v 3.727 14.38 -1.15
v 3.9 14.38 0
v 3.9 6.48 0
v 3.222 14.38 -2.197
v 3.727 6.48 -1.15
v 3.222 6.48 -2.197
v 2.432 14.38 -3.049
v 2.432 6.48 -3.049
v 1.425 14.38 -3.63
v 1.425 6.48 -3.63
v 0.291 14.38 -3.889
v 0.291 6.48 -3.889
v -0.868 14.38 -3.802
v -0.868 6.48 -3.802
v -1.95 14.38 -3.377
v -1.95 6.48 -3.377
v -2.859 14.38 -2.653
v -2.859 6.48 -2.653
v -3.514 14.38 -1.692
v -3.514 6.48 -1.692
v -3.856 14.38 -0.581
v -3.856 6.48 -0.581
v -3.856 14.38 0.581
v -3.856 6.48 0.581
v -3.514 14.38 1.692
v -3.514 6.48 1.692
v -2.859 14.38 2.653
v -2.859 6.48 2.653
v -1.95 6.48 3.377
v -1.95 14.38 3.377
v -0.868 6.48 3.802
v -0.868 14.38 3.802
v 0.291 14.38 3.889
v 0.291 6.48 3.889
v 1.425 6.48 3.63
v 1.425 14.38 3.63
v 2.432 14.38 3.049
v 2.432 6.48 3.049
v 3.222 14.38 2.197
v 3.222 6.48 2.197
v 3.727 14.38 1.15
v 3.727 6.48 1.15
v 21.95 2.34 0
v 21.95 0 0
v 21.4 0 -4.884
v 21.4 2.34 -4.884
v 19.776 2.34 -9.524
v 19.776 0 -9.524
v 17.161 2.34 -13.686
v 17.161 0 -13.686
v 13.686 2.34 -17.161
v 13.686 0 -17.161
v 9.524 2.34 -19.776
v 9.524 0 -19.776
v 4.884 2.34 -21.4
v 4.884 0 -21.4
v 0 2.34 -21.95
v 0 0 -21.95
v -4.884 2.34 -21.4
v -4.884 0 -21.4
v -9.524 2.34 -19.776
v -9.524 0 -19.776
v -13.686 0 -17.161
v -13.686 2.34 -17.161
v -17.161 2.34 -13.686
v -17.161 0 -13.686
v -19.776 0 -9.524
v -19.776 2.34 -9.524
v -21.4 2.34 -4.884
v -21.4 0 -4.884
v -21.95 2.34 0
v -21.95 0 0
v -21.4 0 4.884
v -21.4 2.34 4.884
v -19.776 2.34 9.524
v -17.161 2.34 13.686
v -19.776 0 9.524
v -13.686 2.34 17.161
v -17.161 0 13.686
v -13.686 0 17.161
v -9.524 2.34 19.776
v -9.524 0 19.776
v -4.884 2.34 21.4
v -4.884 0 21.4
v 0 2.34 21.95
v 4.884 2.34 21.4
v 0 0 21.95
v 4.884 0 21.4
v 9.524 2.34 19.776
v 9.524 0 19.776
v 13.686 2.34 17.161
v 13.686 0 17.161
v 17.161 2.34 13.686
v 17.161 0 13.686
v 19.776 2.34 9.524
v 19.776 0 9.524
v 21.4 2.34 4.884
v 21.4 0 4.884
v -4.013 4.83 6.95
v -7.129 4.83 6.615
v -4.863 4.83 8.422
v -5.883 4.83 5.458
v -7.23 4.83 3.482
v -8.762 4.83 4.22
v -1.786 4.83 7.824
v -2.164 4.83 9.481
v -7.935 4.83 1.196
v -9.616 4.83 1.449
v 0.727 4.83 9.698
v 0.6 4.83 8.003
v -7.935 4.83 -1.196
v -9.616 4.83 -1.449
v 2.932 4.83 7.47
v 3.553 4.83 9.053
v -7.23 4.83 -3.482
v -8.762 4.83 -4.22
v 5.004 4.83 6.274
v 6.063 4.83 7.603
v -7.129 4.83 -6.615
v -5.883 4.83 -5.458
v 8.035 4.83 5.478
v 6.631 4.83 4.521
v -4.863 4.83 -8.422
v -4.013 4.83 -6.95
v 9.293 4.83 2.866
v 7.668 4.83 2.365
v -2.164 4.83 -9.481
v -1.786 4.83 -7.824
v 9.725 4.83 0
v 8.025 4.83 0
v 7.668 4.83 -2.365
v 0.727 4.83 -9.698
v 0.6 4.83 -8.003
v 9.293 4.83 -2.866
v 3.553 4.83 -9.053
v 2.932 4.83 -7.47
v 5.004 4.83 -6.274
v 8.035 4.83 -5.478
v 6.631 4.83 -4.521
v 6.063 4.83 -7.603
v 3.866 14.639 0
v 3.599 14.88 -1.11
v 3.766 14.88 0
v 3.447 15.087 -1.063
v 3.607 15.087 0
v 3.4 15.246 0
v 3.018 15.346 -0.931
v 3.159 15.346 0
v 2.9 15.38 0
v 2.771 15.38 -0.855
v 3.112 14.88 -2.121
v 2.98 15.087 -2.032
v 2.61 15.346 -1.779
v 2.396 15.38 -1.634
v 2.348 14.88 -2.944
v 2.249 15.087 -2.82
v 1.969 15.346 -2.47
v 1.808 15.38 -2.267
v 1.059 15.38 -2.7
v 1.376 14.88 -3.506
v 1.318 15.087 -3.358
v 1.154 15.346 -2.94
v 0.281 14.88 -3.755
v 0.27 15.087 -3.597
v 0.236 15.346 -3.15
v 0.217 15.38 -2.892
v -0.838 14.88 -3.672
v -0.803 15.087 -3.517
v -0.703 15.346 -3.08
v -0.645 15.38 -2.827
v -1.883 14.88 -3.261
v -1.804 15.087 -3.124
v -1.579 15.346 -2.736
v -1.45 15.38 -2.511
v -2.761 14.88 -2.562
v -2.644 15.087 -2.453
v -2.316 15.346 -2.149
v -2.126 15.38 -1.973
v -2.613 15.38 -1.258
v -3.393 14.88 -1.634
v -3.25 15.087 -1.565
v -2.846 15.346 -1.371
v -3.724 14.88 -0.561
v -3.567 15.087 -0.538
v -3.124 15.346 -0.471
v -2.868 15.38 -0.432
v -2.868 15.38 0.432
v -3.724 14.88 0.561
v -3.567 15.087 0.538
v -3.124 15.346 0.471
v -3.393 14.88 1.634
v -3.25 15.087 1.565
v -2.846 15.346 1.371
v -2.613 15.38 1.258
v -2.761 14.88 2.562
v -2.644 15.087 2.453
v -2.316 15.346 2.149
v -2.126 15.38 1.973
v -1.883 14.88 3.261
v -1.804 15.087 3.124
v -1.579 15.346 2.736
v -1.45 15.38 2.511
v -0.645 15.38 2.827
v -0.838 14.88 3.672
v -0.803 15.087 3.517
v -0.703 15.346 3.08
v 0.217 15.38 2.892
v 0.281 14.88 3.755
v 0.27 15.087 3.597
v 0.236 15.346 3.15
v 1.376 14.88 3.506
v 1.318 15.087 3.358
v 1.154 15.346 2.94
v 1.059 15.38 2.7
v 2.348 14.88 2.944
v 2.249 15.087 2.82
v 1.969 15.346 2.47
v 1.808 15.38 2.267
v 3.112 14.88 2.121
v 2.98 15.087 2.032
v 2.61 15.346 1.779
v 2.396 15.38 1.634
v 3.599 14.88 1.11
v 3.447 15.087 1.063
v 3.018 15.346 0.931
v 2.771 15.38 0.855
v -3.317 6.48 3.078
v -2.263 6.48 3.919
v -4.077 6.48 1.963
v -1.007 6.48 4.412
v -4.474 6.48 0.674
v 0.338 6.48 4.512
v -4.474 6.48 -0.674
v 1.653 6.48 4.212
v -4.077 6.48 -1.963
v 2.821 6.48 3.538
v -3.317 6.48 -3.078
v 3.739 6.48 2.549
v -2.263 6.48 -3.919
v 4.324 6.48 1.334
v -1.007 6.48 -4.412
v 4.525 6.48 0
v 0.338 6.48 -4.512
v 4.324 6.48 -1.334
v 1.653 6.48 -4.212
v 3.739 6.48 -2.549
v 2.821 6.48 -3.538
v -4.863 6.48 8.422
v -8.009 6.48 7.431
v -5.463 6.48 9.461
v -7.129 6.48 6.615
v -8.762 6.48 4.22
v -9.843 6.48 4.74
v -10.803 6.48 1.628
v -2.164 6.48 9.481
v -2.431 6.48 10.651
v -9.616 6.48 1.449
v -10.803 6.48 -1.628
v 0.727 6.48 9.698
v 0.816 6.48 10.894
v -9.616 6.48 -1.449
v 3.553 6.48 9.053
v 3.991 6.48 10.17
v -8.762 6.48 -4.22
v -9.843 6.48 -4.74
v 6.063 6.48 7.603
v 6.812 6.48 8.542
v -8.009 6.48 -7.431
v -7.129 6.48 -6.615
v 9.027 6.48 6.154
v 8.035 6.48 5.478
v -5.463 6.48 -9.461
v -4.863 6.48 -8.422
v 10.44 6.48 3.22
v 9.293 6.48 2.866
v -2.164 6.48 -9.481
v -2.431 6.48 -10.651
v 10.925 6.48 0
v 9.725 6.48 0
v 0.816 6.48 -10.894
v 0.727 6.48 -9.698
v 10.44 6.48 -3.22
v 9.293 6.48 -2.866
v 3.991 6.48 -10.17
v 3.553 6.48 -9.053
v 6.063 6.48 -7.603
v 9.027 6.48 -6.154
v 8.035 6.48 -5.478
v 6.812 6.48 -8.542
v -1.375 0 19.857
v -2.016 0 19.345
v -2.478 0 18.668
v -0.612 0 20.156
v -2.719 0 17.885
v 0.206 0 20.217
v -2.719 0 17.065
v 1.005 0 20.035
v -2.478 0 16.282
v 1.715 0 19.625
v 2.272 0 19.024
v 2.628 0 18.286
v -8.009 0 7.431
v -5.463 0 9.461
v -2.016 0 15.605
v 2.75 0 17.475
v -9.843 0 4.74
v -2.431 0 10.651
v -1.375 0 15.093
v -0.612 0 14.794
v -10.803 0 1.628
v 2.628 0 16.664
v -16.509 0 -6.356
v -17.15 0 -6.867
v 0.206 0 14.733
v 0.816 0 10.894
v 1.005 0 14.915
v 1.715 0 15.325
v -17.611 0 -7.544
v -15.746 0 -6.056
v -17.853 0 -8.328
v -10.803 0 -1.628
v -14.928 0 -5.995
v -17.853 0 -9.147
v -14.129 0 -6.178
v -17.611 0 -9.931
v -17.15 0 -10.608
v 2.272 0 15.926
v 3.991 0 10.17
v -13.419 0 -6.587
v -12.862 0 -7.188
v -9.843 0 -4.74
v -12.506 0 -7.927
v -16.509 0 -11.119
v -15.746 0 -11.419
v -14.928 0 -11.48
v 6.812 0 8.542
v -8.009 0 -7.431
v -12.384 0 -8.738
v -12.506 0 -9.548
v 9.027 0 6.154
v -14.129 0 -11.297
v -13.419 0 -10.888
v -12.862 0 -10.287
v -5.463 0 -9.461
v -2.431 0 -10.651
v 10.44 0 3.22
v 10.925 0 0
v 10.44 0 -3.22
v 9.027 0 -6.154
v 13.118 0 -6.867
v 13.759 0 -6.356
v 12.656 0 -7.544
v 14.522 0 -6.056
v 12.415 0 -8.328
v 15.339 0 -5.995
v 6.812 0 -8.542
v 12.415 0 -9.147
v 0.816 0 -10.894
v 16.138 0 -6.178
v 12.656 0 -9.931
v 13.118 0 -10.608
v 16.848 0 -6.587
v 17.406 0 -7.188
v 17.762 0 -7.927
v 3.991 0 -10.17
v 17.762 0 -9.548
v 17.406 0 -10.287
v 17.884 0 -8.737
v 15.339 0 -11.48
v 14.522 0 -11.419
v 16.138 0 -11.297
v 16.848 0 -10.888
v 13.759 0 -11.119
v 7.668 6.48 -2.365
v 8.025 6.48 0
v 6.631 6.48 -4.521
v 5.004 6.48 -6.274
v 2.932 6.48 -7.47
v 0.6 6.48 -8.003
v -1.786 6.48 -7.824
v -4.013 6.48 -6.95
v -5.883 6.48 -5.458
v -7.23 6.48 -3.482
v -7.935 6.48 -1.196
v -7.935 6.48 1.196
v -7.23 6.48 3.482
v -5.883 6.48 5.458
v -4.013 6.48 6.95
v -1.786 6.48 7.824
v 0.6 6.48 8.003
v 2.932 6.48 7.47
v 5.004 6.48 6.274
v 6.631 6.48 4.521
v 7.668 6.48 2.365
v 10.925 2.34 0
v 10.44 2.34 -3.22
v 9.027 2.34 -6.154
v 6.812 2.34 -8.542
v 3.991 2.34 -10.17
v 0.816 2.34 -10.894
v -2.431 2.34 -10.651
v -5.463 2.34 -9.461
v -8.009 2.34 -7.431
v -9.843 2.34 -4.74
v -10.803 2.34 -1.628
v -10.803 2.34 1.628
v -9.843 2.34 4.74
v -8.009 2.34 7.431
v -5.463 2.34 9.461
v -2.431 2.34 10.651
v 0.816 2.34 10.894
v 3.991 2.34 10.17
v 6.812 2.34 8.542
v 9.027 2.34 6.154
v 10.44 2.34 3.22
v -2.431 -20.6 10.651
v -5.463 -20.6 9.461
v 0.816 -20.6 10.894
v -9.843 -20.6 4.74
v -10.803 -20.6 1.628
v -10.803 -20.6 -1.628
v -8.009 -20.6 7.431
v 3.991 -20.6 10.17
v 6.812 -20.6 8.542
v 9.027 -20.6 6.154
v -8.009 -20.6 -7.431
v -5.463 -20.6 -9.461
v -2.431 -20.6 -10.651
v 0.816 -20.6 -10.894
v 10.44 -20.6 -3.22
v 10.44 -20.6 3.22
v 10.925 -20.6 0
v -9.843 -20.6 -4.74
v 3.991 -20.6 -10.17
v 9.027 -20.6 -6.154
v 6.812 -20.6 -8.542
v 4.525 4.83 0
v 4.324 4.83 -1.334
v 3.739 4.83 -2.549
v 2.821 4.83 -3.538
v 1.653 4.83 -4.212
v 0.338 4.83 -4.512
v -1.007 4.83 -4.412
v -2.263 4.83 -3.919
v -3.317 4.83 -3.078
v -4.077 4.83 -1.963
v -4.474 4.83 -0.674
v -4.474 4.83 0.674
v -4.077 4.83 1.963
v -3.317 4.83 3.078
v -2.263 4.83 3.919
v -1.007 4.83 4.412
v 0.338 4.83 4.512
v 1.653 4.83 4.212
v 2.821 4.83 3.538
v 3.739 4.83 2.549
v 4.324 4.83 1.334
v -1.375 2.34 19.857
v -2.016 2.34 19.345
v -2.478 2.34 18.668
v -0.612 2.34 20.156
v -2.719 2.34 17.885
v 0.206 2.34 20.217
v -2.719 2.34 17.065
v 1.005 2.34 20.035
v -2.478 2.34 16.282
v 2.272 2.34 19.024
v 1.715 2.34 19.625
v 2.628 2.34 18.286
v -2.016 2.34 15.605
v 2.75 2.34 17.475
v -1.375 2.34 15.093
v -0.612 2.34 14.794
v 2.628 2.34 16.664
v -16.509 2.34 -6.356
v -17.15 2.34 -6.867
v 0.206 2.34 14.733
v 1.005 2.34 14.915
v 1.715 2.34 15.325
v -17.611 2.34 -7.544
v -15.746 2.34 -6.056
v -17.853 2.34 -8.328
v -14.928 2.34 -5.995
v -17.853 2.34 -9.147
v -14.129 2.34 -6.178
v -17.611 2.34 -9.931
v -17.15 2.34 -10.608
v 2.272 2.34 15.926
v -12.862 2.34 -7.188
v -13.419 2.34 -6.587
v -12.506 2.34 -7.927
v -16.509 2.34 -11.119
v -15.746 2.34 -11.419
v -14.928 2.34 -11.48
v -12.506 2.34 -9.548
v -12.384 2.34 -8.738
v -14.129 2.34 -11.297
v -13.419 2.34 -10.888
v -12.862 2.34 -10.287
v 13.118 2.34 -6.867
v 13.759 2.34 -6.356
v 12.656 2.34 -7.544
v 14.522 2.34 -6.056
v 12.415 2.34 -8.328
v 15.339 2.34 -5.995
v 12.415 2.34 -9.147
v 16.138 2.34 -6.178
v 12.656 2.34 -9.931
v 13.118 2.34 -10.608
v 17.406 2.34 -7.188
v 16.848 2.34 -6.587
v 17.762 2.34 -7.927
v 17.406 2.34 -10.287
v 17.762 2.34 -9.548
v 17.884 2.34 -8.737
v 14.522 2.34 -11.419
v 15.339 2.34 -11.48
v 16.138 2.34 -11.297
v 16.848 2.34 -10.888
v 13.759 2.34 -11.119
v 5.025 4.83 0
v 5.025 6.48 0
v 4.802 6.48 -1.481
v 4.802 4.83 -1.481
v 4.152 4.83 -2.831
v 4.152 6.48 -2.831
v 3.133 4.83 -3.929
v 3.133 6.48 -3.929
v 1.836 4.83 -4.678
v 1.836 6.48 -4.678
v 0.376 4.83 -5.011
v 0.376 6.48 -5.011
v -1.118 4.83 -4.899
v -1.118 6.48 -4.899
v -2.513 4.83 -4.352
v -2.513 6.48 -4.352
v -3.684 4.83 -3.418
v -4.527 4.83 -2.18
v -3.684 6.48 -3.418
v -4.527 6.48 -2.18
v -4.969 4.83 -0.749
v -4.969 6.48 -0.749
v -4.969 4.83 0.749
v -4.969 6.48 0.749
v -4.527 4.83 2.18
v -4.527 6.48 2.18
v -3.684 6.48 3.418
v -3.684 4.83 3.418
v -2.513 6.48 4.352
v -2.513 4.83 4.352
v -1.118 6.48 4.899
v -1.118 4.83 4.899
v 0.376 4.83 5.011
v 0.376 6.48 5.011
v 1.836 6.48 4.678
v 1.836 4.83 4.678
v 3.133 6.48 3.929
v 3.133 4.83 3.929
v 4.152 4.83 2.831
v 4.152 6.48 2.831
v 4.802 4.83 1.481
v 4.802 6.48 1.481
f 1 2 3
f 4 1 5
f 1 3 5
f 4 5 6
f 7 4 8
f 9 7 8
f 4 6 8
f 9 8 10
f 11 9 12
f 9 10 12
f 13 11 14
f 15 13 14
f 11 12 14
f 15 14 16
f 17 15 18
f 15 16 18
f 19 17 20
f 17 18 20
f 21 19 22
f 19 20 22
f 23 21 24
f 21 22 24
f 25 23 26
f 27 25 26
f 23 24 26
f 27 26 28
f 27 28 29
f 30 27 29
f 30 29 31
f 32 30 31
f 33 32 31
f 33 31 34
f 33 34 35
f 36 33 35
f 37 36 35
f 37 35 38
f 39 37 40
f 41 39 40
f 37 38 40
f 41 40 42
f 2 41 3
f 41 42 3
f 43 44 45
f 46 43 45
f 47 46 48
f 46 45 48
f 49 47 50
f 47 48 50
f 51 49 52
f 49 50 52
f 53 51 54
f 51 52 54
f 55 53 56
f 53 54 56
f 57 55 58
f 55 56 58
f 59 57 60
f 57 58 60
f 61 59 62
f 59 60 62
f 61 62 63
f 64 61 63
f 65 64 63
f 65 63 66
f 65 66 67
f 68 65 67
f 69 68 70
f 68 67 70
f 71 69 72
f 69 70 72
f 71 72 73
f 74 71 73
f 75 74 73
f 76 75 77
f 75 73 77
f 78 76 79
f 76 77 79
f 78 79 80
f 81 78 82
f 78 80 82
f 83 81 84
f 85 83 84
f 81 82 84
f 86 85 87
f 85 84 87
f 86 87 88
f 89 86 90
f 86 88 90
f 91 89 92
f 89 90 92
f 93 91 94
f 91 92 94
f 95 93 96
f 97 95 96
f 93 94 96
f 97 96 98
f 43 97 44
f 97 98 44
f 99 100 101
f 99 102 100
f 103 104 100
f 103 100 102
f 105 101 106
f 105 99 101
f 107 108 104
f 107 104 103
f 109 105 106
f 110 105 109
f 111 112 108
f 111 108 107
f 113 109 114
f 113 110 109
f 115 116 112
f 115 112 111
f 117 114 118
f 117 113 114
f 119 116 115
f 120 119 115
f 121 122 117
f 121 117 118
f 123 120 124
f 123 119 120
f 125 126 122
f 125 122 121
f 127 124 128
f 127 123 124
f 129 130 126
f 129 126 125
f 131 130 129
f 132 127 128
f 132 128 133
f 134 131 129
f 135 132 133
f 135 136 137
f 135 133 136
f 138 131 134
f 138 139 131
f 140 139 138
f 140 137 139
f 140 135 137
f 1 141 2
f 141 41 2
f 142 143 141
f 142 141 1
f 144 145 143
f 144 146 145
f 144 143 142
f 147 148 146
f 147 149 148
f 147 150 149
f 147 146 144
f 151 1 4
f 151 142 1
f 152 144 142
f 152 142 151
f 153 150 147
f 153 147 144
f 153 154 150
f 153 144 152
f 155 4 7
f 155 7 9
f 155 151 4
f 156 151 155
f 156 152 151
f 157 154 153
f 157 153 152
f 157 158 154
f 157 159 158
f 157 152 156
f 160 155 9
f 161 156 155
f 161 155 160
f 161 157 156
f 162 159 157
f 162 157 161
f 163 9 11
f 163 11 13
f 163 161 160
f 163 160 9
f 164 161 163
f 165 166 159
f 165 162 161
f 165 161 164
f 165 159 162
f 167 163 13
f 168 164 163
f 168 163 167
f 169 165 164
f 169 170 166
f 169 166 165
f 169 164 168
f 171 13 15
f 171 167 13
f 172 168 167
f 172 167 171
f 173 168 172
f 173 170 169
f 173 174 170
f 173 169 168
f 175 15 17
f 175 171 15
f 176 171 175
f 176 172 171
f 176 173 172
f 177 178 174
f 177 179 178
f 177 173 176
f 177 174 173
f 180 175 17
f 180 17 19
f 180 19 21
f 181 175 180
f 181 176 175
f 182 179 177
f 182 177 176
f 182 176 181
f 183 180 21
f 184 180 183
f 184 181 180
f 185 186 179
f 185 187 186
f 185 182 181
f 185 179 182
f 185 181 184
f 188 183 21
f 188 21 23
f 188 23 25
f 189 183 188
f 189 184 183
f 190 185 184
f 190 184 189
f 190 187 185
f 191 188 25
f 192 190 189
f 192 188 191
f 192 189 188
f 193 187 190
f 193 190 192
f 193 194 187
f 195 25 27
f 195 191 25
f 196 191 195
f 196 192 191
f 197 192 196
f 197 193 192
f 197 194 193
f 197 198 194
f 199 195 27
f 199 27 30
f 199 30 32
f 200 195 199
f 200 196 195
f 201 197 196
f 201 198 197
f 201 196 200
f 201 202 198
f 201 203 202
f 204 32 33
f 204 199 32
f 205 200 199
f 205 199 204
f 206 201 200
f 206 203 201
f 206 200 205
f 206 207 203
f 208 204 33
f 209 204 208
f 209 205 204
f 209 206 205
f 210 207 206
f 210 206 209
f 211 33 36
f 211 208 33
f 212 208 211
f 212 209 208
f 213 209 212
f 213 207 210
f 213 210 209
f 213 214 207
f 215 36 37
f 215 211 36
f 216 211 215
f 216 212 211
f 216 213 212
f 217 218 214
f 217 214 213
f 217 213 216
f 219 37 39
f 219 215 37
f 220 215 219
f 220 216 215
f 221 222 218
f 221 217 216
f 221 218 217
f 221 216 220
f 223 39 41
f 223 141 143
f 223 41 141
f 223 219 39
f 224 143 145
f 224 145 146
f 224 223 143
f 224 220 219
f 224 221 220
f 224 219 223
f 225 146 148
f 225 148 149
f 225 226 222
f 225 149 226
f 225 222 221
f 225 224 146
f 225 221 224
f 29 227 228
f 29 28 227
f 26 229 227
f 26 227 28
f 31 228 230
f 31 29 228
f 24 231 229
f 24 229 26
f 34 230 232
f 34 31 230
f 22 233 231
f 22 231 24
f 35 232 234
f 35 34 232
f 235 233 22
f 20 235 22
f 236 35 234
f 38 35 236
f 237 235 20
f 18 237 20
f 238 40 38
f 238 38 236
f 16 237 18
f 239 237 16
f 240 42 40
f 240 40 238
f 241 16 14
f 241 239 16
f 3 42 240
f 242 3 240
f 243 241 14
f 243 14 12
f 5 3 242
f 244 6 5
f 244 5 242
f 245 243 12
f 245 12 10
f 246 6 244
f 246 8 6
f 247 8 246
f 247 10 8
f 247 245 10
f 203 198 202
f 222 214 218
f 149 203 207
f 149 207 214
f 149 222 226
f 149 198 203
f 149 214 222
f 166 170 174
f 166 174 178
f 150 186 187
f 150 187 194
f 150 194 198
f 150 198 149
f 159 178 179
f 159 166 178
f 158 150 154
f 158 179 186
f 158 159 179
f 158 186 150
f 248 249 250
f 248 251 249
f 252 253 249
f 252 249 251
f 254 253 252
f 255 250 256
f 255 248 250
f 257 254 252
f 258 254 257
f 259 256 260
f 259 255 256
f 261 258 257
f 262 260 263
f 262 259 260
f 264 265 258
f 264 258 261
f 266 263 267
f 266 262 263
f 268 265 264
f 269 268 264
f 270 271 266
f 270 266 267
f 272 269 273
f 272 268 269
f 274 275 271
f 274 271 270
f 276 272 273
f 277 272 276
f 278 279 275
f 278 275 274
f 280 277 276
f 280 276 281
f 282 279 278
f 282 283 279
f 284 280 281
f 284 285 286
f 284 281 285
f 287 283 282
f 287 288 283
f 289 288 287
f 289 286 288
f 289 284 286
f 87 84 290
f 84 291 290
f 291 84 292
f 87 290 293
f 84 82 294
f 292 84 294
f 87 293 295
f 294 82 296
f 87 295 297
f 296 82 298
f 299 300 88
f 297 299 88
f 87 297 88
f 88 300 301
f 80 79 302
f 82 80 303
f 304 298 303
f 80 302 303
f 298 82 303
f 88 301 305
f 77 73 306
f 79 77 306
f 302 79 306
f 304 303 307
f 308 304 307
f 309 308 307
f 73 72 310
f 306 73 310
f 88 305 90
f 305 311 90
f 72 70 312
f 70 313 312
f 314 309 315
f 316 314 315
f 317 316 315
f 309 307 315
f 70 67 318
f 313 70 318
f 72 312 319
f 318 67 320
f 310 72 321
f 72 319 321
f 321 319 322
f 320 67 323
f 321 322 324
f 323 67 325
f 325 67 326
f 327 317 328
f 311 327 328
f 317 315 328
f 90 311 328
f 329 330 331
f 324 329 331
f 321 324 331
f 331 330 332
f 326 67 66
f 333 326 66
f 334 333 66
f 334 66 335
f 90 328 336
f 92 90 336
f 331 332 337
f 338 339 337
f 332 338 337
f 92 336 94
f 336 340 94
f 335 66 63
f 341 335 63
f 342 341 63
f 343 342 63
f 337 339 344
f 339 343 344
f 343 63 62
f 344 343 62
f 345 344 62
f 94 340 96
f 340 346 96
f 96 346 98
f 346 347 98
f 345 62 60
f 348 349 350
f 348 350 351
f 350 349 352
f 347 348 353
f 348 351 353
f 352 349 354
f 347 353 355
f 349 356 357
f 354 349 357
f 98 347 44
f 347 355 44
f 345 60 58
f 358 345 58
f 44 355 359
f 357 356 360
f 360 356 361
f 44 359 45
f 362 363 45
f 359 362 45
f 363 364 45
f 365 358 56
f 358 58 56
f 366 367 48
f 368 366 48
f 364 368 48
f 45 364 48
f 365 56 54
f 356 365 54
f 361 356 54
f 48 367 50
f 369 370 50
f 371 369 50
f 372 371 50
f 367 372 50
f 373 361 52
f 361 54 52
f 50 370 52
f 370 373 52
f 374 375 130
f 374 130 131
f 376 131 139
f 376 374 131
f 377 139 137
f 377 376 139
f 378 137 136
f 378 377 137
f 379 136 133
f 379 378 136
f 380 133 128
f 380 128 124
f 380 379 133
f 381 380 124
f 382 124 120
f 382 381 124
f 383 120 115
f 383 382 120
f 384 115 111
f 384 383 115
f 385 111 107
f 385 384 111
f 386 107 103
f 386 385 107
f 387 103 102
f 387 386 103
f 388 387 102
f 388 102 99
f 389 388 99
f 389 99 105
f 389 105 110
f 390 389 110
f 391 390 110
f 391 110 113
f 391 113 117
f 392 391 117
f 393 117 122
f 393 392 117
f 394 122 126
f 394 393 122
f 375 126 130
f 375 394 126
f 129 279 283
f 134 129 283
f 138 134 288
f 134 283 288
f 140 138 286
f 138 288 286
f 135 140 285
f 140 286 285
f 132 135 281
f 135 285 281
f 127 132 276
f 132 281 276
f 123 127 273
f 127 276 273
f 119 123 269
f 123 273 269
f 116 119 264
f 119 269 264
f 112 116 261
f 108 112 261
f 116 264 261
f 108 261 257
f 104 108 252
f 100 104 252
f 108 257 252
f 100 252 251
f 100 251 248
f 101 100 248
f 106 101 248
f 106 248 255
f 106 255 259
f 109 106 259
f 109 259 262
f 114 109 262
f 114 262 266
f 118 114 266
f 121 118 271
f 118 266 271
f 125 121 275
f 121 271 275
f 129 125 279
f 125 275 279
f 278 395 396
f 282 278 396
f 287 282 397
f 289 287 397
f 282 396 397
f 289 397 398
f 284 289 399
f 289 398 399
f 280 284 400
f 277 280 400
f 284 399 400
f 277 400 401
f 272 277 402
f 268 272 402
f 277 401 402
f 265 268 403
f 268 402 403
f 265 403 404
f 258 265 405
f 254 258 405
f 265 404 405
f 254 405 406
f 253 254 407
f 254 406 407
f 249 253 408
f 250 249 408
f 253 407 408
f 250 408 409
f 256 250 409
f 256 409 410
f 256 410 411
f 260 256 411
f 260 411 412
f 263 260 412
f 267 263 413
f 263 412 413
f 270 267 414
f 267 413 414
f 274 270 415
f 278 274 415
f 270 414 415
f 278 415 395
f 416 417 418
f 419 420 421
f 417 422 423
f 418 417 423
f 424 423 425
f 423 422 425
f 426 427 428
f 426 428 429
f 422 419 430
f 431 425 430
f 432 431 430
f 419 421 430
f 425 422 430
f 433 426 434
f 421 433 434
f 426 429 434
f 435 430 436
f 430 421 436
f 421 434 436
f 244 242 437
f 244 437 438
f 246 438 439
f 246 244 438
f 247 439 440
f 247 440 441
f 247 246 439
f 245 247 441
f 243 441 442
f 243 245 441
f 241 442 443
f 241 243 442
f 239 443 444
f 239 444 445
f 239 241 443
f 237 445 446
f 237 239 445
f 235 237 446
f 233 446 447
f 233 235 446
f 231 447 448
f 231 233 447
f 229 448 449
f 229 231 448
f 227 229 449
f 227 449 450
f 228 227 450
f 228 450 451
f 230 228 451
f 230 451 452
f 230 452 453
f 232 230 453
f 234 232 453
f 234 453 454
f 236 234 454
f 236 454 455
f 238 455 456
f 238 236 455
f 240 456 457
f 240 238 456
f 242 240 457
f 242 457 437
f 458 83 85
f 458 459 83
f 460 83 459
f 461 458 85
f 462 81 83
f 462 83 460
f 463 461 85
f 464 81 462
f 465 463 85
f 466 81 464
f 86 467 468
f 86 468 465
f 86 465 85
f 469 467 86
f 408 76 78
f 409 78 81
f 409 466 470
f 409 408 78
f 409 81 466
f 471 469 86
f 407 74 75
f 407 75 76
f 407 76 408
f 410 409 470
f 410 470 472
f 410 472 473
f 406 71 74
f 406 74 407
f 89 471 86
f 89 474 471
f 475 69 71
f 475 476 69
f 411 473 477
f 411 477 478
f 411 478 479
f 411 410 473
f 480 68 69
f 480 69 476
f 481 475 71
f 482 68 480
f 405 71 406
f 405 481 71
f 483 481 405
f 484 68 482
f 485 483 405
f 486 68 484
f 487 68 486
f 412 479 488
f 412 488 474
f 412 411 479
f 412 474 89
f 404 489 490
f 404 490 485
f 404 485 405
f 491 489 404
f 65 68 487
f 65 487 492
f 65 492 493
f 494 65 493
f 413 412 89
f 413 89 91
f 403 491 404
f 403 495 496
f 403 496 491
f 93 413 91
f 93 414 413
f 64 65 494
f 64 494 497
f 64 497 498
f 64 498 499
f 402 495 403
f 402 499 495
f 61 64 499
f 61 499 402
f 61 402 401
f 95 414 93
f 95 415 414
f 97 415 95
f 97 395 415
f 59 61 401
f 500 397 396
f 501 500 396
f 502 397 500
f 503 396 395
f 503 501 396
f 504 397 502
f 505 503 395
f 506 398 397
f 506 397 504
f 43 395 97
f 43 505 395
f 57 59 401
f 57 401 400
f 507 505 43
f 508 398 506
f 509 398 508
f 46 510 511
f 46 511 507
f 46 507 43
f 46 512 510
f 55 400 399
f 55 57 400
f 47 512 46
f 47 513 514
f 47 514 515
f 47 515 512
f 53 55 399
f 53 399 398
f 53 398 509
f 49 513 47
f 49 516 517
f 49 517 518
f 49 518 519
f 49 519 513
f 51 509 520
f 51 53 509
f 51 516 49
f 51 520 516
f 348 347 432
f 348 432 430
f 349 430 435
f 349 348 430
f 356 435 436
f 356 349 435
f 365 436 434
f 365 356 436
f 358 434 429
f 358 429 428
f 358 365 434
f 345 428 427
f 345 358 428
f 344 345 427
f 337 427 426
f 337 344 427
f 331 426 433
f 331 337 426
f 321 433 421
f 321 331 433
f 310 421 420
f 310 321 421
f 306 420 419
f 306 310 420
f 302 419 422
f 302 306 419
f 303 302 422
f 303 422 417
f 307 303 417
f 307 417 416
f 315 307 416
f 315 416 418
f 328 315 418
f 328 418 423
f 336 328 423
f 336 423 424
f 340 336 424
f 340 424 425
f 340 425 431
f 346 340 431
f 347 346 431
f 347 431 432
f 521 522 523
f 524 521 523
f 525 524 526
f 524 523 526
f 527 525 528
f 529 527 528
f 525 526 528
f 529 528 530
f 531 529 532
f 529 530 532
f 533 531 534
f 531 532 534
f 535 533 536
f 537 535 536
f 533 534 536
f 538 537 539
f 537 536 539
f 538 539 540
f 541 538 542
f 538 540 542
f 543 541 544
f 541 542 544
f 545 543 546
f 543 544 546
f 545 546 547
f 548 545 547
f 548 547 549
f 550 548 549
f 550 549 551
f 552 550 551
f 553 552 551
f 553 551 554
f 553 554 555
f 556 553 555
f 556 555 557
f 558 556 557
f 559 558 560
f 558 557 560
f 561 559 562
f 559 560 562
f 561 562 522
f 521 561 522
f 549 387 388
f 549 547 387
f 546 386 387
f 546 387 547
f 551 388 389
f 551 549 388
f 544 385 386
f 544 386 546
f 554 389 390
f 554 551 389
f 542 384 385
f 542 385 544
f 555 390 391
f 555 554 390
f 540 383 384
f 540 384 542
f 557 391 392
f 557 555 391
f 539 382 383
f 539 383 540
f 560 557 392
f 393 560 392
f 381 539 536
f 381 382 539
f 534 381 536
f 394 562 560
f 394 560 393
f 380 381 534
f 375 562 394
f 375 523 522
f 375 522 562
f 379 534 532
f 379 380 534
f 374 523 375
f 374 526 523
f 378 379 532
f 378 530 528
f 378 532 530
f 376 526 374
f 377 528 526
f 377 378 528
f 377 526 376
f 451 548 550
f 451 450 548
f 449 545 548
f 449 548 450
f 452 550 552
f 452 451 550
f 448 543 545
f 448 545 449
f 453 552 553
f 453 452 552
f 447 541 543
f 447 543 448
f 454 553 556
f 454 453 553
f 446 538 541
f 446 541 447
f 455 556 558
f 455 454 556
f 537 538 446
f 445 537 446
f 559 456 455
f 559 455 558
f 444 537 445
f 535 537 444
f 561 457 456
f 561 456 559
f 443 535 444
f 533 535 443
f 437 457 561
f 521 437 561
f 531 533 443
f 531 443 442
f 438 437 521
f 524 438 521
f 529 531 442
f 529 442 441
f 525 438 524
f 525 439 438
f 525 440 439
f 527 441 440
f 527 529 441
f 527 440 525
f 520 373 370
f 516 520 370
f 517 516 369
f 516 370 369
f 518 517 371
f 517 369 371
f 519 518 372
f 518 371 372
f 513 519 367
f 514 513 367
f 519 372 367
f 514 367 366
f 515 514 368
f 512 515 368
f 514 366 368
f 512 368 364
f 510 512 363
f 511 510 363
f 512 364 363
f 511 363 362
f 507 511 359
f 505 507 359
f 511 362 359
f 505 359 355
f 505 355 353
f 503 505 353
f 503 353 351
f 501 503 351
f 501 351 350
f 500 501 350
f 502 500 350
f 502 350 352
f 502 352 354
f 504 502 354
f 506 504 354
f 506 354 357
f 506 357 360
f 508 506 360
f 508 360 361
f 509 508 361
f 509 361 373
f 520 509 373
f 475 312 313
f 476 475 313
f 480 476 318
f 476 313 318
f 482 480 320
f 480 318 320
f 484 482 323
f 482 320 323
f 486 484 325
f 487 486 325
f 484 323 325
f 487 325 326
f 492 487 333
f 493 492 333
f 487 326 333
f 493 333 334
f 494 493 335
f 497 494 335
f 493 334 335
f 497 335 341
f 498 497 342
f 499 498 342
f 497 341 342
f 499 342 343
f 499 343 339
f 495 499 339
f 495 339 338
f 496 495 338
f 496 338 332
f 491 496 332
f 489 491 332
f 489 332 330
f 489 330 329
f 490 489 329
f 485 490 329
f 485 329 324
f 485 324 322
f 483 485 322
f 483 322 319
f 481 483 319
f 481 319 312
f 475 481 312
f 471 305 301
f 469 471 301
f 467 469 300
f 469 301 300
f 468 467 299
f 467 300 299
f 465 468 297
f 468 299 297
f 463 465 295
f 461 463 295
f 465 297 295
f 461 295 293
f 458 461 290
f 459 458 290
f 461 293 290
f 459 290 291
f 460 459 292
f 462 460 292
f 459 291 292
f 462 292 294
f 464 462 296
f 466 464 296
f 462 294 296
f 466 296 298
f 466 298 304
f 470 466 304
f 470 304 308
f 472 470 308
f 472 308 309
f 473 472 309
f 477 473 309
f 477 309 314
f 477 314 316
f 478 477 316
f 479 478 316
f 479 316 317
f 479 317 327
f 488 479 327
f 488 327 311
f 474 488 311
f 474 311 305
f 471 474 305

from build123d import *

# Parameters (mm, degrees)
SKETCH1_R                = 21.95
BOSS_EXTRUDE1_DEPTH      = 2.34
SKETCH2_R                = 10.925
BOSS_EXTRUDE2_DEPTH      = 4.14
BOSS_EXTRUDE2_DEPTH_BACK = 22.94
SKETCH3_R                = 2.75
CUT_EXTRUDE1_DEPTH       = 7.48
CIRPATTERN1_COUNT        = 3
SKETCH4_R                = 9.725
SKETCH4_R_2              = 8.025
SKETCH4_R_3              = 5.025
SKETCH4_R_4              = 4.525
CUT_EXTRUDE2_DEPTH       = 1.65
SKETCH5_R                = 3.9
BOSS_EXTRUDE3_DEPTH      = 8.9
FILLET1_R                = 1


with BuildPart() as part:
    # Sketch1 → Boss-Extrude1 (new body)
    with BuildSketch(Plane(origin=(0, 0, 0), x_dir=(1, 0, 0), z_dir=(0, 1, 0))):
        Circle(SKETCH1_R)
    extrude(amount=BOSS_EXTRUDE1_DEPTH)

    # Sketch2 → Boss-Extrude2 (add, two sides)
    with BuildSketch(Plane(origin=(0, 2.34, 0), x_dir=(1, 0, 0), z_dir=(0, 1, 0))) as boss_extrude2_sk:
        Circle(SKETCH2_R)
    extrude(amount=BOSS_EXTRUDE2_DEPTH)
    extrude(boss_extrude2_sk.sketch, amount=-BOSS_EXTRUDE2_DEPTH_BACK)

    # Sketch3 → Cut-Extrude1 (cut, through all)
    with BuildSketch(Plane.XZ):
        with Locations((0, 17.475)):
            Circle(SKETCH3_R)
    cut_extrude1 = extrude(amount=-CUT_EXTRUDE1_DEPTH, mode=Mode.SUBTRACT)

    # CirPattern1: Cut-Extrude1 ×3 about axis
    cirpattern1_axis = Axis((0, 0, 0), (0, 1, 0))
    for i in range(1, CIRPATTERN1_COUNT):
        add(cut_extrude1.rotate(cirpattern1_axis, i * 360 / CIRPATTERN1_COUNT), mode=Mode.SUBTRACT)

    # Sketch4 → Cut-Extrude2 (cut)
    with BuildSketch(Plane(origin=(0, 6.48, 0), x_dir=(1, 0, 0), z_dir=(0, 1, 0))):
        Circle(SKETCH4_R)
        Circle(SKETCH4_R_2, mode=Mode.SUBTRACT)
        Circle(SKETCH4_R_3)
        Circle(SKETCH4_R_4, mode=Mode.SUBTRACT)
    extrude(amount=-CUT_EXTRUDE2_DEPTH, mode=Mode.SUBTRACT)

    # Sketch5 → Boss-Extrude3 (add)
    with BuildSketch(Plane(origin=(0, 6.48, 0), x_dir=(1, 0, 0), z_dir=(0, 1, 0))):
        Circle(SKETCH5_R)
    extrude(amount=BOSS_EXTRUDE3_DEPTH)

    # Fillet1
    fillet1_edges = [part.edges().sort_by_distance(p)[0] for p in [
        (-3.9, 15.38, 0),
    ]]
    fillet(fillet1_edges, radius=FILLET1_R)


solid = part.part
